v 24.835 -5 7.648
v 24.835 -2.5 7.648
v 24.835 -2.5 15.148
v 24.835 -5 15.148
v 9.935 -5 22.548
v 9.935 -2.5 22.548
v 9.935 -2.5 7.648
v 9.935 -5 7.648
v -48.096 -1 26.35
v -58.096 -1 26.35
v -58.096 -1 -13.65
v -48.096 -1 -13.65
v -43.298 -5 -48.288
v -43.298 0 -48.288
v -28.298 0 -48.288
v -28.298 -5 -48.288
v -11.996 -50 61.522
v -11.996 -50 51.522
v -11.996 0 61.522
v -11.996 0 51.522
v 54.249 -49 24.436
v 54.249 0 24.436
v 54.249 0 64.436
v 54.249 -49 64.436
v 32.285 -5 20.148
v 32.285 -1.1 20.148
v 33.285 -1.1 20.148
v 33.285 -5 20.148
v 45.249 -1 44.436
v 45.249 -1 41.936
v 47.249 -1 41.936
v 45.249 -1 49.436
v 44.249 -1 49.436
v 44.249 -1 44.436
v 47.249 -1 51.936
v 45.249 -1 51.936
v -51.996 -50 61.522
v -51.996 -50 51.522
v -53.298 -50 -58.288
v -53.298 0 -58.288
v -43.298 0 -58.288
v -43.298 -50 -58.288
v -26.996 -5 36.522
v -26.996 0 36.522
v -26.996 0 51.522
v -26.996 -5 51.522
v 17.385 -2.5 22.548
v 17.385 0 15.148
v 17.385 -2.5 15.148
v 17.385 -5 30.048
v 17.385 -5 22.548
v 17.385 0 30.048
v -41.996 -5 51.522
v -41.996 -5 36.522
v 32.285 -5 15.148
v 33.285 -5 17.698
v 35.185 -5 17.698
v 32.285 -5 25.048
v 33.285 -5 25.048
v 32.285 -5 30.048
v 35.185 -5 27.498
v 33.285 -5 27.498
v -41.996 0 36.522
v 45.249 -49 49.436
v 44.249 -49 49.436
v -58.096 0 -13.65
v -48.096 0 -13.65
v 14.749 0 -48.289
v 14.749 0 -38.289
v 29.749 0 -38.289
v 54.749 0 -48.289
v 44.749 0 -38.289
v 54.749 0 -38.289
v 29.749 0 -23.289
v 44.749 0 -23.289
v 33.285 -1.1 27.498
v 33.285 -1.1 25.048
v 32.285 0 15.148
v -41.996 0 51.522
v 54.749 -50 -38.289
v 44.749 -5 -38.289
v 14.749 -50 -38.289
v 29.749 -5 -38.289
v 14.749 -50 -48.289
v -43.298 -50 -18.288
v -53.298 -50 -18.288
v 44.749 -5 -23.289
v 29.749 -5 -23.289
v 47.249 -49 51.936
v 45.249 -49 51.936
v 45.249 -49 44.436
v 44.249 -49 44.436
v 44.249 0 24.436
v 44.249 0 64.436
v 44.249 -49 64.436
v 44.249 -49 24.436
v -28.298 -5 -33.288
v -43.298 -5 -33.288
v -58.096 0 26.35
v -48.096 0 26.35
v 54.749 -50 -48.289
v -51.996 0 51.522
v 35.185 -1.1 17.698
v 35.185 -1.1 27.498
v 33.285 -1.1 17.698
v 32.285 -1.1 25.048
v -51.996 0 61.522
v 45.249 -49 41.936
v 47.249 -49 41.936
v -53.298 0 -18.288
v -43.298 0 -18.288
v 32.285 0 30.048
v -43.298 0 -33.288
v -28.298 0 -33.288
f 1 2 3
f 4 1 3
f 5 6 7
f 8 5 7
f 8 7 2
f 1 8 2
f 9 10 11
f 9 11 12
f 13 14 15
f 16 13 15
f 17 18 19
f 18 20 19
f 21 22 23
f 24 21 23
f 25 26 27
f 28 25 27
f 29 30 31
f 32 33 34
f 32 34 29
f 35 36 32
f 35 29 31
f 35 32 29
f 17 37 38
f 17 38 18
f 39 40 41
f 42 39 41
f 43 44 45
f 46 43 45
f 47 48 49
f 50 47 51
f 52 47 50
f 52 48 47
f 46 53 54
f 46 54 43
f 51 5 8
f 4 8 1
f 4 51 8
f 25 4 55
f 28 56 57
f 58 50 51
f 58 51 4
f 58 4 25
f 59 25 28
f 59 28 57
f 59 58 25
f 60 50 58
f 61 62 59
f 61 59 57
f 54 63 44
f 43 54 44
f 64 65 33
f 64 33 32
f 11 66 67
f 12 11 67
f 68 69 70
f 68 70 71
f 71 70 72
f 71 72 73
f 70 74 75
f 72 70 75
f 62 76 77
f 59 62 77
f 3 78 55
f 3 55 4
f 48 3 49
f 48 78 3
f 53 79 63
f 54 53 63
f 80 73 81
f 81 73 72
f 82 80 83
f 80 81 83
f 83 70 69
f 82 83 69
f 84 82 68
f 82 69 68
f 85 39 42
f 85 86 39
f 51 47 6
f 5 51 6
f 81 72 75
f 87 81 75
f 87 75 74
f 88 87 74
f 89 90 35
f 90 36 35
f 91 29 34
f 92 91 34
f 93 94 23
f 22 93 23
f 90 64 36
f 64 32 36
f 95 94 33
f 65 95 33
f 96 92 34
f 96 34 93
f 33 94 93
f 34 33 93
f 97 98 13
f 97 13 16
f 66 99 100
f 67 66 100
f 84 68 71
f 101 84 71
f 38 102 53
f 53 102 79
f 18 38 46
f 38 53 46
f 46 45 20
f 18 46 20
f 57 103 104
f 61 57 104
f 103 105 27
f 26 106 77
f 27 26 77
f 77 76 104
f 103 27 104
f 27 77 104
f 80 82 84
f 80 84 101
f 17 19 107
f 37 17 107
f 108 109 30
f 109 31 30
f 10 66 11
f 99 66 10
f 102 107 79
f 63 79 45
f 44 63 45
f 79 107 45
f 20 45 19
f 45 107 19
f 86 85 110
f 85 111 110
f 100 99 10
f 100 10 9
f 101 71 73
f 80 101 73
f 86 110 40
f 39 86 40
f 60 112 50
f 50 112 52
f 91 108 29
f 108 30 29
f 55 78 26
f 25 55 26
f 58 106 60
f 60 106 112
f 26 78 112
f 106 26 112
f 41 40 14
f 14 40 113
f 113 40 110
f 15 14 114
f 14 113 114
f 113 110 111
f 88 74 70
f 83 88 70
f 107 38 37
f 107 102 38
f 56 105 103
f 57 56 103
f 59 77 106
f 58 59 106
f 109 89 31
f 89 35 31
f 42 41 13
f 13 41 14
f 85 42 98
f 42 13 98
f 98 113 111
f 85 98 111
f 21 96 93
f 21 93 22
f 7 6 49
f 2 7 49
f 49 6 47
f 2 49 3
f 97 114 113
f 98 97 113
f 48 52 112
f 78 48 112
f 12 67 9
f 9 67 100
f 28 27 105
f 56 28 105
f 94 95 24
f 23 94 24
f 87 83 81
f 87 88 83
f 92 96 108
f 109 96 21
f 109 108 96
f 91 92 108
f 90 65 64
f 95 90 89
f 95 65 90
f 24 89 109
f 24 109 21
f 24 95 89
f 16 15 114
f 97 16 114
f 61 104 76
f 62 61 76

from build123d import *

# Parameters (mm, degrees)
F0_W      = 10
F0_H      = 10
F0_W_2    = 7.5
F0_H_2    = 7.5
F1_DEPTH  = 5
F0_W_3    = 7.45
F0_H_3    = 7.4
F2_W      = 10
F2_H      = 10
F3_DEPTH  = 45
F4_W      = 10
F4_H      = 10
F5_DEPTH  = 45
F6_W      = 10
F6_H      = 10
F7_DEPTH  = 44
F0_H_4    = 40
F8_DEPTH  = 1
F9_W      = 10
F9_H      = 10
F10_DEPTH = 45
F11_DEPTH = 4
F12_DEPTH = 1.1
F13_DEPTH = 2.5


with BuildPart() as f1:
    # F0 (on Front) → F1 (new body)
    with BuildSketch(Plane.XZ):
        with Locations((-48.2978210601, -53.2876135409)):
            Rectangle(F0_W, F0_H)
        with Locations((-32.0478210601, -37.0376135409)):
            Rectangle(F0_W_2, F0_H_2)
        Polygon((-43.2978210601, -18.2876135409), (-53.2978210601, -18.2876135409), (-53.2978210601, -48.2876135409), (-43.2978210601, -48.2876135409), (-43.2978210601, -33.2876135409), align=None)
        Polygon((-43.2978210601, -33.2876135409), (-43.2978210601, -48.2876135409), (-28.2978210601, -48.2876135409), (-28.2978210601, -40.7876135409), (-35.7978210601, -40.7876135409), (-35.7978210601, -33.2876135409), align=None)
    extrude(amount=F1_DEPTH)

    # F4 (on face) → F5 (join)
    with BuildSketch(Plane.XZ.offset(5)):
        with Locations((-48.2978210601, -53.2876135409)):
            Rectangle(F4_W, F4_H)
        Polygon((-53.2978210601, -48.2876135409), (-43.2978210601, -48.2876135409), (-43.2978210601, -33.2876135409), (-43.2978210601, -18.2876135409), (-53.2978210601, -18.2876135409), align=None)
    extrude(amount=F5_DEPTH)


with BuildPart() as f1b:
    # F0 (on Front) → F1, piece 2 (new body)
    with BuildSketch(Plane.XZ):
        with Locations((49.7493183613, -43.2888631523)):
            Rectangle(F0_W, F0_H)
        Polygon((14.7493183613, -38.2888631523), (14.7493183613, -48.2888631523), (44.7493183613, -48.2888631523), (44.7493183613, -38.2888631523), (29.7493183613, -38.2888631523), align=None)
        Polygon((29.7493183613, -38.2888631523), (44.7493183613, -38.2888631523), (44.7493183613, -23.2888631523), (40.9993183613, -23.2888631523), (40.9993183613, -34.5388631523), (29.7493183613, -34.5388631523), align=None)
        with Locations((33.4993183613, -27.0388631523)):
            Rectangle(F0_W_2, F0_H_2)
        Polygon((37.2493183613, -30.7888631523), (40.9993183613, -23.2888631523), (37.2493183613, -23.2888631523), align=None)
        Polygon((29.7493183613, -30.7888631523), (29.7493183613, -34.5388631523), (40.9993183613, -34.5388631523), (40.9993183613, -23.2888631523), (37.2493183613, -30.7888631523), align=None)
    extrude(amount=F1_DEPTH)

    # F9 (on face) → F10 (join)
    with BuildSketch(Plane.XZ.offset(5)):
        with Locations((49.7493183613, -43.2888631523)):
            Rectangle(F9_W, F9_H)
        Polygon((44.7493183613, -48.2888631523), (44.7493183613, -38.2888631523), (29.7493183613, -38.2888631523), (14.7493183613, -38.2888631523), (14.7493183613, -48.2888631523), align=None)
    extrude(amount=F10_DEPTH)


with BuildPart() as f1c:
    # F0 (on Front) → F1, piece 3 (new body)
    with BuildSketch(Plane.XZ):
        with Locations((49.249061197, 59.43582654)):
            Rectangle(F0_W, F0_H)
        Polygon((45.249061197, 49.43582654), (44.249061197, 49.43582654), (44.249061197, 44.43582654), (45.249061197, 44.43582654), (45.249061197, 41.93582654), (47.249061197, 41.93582654), (47.249061197, 51.93582654), (45.249061197, 51.93582654), align=None)
        Polygon((54.249061197, 24.43582654), (54.249061197, 54.43582654), (44.249061197, 54.43582654), (44.249061197, 49.43582654), (45.249061197, 49.43582654), (45.249061197, 51.93582654), (47.249061197, 51.93582654), (47.249061197, 41.93582654), (45.249061197, 41.93582654), (45.249061197, 44.43582654), (44.249061197, 44.43582654), (44.249061197, 39.43582654), (44.249061197, 24.43582654), align=None)
    extrude(amount=F1_DEPTH)

    # F6 (on face) → F7 (join)
    with BuildSketch(Plane.XZ.offset(5)):
        with Locations((49.249061197, 59.43582654)):
            Rectangle(F6_W, F6_H)
        Polygon((54.249061197, 54.43582654), (44.249061197, 54.43582654), (44.249061197, 49.43582654), (45.249061197, 49.43582654), (45.249061197, 51.93582654), (47.249061197, 51.93582654), (47.249061197, 41.93582654), (45.249061197, 41.93582654), (45.249061197, 44.43582654), (44.249061197, 44.43582654), (44.249061197, 39.43582654), (44.249061197, 24.43582654), (54.249061197, 24.43582654), align=None)
    extrude(amount=F7_DEPTH)

    # F11 (cut): a face of the model
    f11_faces = [f1c.faces().sort_by_distance(p)[0] for p in [
        (45.949061197, -5, 46.93582654),
    ]]
    extrude(f11_faces, amount=-F11_DEPTH, mode=Mode.SUBTRACT)


with BuildPart() as f1d:
    # F0 (on Front) → F1, piece 4 (new body)
    with BuildSketch(Plane.XZ):
        with Locations((-46.9960268587, 56.5215918422)):
            Rectangle(F0_W, F0_H)
        Polygon((-11.9960268587, 61.5215918422), (-41.9960268587, 61.5215918422), (-41.9960268587, 51.5215918422), (-26.9960268587, 51.5215918422), (-11.9960268587, 51.5215918422), align=None)
        Polygon((-26.9960268587, 51.5215918422), (-41.9960268587, 51.5215918422), (-41.9960268587, 36.5215918422), (-38.2460268587, 36.5215918422), (-38.2460268587, 47.7715918422), (-26.9960268587, 47.7715918422), align=None)
        Polygon((-26.9960268587, 44.0215918422), (-26.9960268587, 47.7715918422), (-34.4960268587, 44.0215918422), align=None)
        with Locations((-30.7460268587, 40.2715918422)):
            Rectangle(F0_W_2, F0_H_2)
        Polygon((-34.4960268587, 44.0215918422), (-26.9960268587, 47.7715918422), (-38.2460268587, 47.7715918422), (-38.2460268587, 36.5215918422), (-34.4960268587, 36.5215918422), align=None)
    extrude(amount=F1_DEPTH)

    # F2 (on face) → F3 (join)
    with BuildSketch(Plane.XZ.offset(5)):
        with Locations((-46.9960268587, 56.5215918422)):
            Rectangle(F2_W, F2_H)
        Polygon((-41.9960268587, 61.5215918422), (-41.9960268587, 51.5215918422), (-26.9960268587, 51.5215918422), (-11.9960268587, 51.5215918422), (-11.9960268587, 61.5215918422), align=None)
    extrude(amount=F3_DEPTH)


with BuildPart() as f1e:
    # F0 (on Front) → F1, piece 5 (new body)
    with BuildSketch(Plane.XZ):
        Polygon((17.3845035851, 22.5478581712), (9.9345035851, 22.5478581712), (9.9345035851, 7.6478581712), (24.8345035851, 7.6478581712), (24.8345035851, 15.1478581712), (17.3845035851, 15.1478581712), align=None)
        Polygon((33.2845035851, 25.0478581712), (32.2845035851, 25.0478581712), (32.2845035851, 20.1478581712), (33.2845035851, 20.1478581712), (33.2845035851, 17.6978581712), (35.1845035851, 17.6978581712), (35.1845035851, 27.4978581712), (33.2845035851, 27.4978581712), align=None)
        with Locations((21.1095035851, 18.8478581712)):
            Rectangle(F0_W_3, F0_H_3)
        Polygon((17.3845035851, 30.0478581712), (17.3845035851, 22.5478581712), (24.8345035851, 22.5478581712), (24.8345035851, 15.1478581712), (32.2845035851, 15.1478581712), (32.2845035851, 20.1478581712), (32.2845035851, 25.0478581712), (32.2845035851, 30.0478581712), align=None)
    extrude(amount=F1_DEPTH)

    # F0 (on Front) → F12 (cut)
    with BuildSketch(Plane.XZ):
        Polygon((33.2845035851, 25.0478581712), (32.2845035851, 25.0478581712), (32.2845035851, 20.1478581712), (33.2845035851, 20.1478581712), (33.2845035851, 17.6978581712), (35.1845035851, 17.6978581712), (35.1845035851, 27.4978581712), (33.2845035851, 27.4978581712), align=None)
    extrude(amount=F12_DEPTH, mode=Mode.SUBTRACT)

    # F0 (on Front) → F13 (cut)
    with BuildSketch(Plane.XZ):
        Polygon((17.3845035851, 22.5478581712), (9.9345035851, 22.5478581712), (9.9345035851, 7.6478581712), (24.8345035851, 7.6478581712), (24.8345035851, 15.1478581712), (17.3845035851, 15.1478581712), align=None)
    extrude(amount=F13_DEPTH, mode=Mode.SUBTRACT)


with BuildPart() as f8:
    # F0 (on Front) → F8 (new body)
    with BuildSketch(Plane.XZ):
        with Locations((-53.0958873034, 6.3497829065)):
            Rectangle(F0_W, F0_H_4)
    extrude(amount=F8_DEPTH)


solid = Compound([f1.part, f1b.part, f1c.part, f1d.part, f1e.part, f8.part])
